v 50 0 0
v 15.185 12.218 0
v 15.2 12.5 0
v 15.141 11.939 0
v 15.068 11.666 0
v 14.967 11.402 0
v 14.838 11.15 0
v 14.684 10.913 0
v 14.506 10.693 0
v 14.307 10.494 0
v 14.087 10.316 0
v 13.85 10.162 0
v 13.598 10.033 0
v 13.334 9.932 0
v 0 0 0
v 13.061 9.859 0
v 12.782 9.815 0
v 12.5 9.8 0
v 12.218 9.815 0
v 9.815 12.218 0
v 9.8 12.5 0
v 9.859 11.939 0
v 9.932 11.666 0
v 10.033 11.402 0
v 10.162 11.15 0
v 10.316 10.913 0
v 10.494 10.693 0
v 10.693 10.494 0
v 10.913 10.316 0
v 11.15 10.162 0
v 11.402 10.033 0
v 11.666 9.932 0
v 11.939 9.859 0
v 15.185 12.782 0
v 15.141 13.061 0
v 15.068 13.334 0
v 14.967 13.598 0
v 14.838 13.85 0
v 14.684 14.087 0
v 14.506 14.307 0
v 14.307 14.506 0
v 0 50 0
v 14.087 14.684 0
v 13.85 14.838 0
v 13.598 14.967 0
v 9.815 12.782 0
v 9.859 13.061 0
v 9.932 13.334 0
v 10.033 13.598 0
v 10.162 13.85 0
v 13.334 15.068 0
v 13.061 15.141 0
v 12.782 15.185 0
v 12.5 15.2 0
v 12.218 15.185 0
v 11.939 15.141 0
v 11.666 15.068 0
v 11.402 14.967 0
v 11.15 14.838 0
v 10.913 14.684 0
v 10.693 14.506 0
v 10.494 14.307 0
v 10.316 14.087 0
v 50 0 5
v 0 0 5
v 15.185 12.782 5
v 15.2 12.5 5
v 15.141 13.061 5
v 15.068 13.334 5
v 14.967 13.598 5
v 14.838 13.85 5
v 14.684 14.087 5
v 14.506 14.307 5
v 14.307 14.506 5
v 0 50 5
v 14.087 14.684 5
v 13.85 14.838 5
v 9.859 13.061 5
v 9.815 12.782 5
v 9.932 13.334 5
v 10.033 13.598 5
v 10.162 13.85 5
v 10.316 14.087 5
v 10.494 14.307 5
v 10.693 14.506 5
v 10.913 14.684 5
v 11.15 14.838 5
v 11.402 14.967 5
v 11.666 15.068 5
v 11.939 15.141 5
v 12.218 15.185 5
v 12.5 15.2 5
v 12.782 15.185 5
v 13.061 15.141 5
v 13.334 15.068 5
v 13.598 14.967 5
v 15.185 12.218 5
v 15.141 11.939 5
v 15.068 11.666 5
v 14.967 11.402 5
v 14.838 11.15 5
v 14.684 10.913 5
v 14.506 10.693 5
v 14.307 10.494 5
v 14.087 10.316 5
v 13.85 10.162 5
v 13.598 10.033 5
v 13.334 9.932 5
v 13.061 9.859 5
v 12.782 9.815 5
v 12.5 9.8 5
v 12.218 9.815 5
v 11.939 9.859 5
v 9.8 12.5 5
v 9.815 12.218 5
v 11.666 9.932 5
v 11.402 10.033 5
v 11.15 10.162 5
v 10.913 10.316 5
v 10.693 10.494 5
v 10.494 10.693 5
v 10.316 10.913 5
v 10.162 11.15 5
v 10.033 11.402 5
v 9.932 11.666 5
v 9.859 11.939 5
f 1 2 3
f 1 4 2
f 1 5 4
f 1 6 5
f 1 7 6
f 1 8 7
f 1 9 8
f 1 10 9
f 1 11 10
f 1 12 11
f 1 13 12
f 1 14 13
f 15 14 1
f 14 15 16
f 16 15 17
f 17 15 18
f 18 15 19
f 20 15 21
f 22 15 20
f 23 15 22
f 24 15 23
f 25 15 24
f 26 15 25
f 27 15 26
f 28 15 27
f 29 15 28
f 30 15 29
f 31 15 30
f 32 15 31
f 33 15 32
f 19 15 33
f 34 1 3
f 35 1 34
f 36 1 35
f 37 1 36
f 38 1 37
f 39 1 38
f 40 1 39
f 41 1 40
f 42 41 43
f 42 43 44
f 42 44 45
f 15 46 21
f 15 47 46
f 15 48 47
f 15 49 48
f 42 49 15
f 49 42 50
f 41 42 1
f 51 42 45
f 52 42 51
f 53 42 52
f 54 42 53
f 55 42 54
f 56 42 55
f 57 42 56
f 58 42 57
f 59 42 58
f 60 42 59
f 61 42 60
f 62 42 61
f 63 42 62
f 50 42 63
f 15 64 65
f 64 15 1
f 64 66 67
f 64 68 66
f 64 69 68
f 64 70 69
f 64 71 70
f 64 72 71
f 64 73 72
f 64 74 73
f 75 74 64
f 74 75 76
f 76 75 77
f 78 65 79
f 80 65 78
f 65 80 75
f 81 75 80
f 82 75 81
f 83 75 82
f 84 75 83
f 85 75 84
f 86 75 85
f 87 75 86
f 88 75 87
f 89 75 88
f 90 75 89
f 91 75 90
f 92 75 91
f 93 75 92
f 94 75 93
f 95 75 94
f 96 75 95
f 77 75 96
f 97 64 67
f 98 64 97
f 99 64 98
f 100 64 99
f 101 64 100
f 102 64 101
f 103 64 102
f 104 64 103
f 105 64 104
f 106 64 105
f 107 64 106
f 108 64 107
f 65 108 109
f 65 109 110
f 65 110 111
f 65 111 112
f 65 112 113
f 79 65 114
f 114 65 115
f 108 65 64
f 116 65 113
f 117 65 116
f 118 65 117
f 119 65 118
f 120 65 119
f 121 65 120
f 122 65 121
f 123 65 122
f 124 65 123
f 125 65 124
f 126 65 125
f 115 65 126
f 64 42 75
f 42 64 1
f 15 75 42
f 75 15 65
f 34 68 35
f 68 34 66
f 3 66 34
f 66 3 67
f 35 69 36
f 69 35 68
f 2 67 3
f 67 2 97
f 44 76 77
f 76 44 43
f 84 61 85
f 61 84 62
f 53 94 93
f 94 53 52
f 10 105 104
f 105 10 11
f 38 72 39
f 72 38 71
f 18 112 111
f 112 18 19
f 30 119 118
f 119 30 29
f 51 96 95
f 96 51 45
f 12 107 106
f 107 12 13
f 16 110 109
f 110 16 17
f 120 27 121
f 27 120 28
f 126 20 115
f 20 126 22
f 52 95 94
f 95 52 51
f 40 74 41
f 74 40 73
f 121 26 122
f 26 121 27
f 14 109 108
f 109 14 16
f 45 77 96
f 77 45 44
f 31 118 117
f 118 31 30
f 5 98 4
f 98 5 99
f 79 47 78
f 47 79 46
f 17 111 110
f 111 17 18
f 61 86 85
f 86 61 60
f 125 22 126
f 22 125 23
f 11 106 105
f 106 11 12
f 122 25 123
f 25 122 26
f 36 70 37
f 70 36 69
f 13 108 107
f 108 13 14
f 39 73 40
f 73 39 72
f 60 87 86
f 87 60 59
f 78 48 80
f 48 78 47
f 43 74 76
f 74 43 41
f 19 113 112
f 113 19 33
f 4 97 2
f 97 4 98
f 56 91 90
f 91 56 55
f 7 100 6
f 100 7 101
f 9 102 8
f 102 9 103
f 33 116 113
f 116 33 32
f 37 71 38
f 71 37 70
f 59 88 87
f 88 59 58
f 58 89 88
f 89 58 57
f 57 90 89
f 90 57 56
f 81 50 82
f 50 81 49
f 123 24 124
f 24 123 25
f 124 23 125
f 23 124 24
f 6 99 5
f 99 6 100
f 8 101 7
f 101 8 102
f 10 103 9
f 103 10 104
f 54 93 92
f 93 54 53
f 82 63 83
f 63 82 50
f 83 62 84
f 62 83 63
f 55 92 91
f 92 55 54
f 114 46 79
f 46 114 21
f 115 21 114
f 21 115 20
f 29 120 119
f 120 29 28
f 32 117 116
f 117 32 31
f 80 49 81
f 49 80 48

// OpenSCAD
// Triangular reinforcement gusset.
$fn = 60;
eps = 0.02;
leg = 50;
thickness = 5;
difference() {
    linear_extrude(height=thickness) polygon(points=[[0,0],[leg,0],[0,leg]]);
    translate([leg*0.25,leg*0.25,-eps]) cylinder(d=5.4,h=thickness+2*eps);
}
